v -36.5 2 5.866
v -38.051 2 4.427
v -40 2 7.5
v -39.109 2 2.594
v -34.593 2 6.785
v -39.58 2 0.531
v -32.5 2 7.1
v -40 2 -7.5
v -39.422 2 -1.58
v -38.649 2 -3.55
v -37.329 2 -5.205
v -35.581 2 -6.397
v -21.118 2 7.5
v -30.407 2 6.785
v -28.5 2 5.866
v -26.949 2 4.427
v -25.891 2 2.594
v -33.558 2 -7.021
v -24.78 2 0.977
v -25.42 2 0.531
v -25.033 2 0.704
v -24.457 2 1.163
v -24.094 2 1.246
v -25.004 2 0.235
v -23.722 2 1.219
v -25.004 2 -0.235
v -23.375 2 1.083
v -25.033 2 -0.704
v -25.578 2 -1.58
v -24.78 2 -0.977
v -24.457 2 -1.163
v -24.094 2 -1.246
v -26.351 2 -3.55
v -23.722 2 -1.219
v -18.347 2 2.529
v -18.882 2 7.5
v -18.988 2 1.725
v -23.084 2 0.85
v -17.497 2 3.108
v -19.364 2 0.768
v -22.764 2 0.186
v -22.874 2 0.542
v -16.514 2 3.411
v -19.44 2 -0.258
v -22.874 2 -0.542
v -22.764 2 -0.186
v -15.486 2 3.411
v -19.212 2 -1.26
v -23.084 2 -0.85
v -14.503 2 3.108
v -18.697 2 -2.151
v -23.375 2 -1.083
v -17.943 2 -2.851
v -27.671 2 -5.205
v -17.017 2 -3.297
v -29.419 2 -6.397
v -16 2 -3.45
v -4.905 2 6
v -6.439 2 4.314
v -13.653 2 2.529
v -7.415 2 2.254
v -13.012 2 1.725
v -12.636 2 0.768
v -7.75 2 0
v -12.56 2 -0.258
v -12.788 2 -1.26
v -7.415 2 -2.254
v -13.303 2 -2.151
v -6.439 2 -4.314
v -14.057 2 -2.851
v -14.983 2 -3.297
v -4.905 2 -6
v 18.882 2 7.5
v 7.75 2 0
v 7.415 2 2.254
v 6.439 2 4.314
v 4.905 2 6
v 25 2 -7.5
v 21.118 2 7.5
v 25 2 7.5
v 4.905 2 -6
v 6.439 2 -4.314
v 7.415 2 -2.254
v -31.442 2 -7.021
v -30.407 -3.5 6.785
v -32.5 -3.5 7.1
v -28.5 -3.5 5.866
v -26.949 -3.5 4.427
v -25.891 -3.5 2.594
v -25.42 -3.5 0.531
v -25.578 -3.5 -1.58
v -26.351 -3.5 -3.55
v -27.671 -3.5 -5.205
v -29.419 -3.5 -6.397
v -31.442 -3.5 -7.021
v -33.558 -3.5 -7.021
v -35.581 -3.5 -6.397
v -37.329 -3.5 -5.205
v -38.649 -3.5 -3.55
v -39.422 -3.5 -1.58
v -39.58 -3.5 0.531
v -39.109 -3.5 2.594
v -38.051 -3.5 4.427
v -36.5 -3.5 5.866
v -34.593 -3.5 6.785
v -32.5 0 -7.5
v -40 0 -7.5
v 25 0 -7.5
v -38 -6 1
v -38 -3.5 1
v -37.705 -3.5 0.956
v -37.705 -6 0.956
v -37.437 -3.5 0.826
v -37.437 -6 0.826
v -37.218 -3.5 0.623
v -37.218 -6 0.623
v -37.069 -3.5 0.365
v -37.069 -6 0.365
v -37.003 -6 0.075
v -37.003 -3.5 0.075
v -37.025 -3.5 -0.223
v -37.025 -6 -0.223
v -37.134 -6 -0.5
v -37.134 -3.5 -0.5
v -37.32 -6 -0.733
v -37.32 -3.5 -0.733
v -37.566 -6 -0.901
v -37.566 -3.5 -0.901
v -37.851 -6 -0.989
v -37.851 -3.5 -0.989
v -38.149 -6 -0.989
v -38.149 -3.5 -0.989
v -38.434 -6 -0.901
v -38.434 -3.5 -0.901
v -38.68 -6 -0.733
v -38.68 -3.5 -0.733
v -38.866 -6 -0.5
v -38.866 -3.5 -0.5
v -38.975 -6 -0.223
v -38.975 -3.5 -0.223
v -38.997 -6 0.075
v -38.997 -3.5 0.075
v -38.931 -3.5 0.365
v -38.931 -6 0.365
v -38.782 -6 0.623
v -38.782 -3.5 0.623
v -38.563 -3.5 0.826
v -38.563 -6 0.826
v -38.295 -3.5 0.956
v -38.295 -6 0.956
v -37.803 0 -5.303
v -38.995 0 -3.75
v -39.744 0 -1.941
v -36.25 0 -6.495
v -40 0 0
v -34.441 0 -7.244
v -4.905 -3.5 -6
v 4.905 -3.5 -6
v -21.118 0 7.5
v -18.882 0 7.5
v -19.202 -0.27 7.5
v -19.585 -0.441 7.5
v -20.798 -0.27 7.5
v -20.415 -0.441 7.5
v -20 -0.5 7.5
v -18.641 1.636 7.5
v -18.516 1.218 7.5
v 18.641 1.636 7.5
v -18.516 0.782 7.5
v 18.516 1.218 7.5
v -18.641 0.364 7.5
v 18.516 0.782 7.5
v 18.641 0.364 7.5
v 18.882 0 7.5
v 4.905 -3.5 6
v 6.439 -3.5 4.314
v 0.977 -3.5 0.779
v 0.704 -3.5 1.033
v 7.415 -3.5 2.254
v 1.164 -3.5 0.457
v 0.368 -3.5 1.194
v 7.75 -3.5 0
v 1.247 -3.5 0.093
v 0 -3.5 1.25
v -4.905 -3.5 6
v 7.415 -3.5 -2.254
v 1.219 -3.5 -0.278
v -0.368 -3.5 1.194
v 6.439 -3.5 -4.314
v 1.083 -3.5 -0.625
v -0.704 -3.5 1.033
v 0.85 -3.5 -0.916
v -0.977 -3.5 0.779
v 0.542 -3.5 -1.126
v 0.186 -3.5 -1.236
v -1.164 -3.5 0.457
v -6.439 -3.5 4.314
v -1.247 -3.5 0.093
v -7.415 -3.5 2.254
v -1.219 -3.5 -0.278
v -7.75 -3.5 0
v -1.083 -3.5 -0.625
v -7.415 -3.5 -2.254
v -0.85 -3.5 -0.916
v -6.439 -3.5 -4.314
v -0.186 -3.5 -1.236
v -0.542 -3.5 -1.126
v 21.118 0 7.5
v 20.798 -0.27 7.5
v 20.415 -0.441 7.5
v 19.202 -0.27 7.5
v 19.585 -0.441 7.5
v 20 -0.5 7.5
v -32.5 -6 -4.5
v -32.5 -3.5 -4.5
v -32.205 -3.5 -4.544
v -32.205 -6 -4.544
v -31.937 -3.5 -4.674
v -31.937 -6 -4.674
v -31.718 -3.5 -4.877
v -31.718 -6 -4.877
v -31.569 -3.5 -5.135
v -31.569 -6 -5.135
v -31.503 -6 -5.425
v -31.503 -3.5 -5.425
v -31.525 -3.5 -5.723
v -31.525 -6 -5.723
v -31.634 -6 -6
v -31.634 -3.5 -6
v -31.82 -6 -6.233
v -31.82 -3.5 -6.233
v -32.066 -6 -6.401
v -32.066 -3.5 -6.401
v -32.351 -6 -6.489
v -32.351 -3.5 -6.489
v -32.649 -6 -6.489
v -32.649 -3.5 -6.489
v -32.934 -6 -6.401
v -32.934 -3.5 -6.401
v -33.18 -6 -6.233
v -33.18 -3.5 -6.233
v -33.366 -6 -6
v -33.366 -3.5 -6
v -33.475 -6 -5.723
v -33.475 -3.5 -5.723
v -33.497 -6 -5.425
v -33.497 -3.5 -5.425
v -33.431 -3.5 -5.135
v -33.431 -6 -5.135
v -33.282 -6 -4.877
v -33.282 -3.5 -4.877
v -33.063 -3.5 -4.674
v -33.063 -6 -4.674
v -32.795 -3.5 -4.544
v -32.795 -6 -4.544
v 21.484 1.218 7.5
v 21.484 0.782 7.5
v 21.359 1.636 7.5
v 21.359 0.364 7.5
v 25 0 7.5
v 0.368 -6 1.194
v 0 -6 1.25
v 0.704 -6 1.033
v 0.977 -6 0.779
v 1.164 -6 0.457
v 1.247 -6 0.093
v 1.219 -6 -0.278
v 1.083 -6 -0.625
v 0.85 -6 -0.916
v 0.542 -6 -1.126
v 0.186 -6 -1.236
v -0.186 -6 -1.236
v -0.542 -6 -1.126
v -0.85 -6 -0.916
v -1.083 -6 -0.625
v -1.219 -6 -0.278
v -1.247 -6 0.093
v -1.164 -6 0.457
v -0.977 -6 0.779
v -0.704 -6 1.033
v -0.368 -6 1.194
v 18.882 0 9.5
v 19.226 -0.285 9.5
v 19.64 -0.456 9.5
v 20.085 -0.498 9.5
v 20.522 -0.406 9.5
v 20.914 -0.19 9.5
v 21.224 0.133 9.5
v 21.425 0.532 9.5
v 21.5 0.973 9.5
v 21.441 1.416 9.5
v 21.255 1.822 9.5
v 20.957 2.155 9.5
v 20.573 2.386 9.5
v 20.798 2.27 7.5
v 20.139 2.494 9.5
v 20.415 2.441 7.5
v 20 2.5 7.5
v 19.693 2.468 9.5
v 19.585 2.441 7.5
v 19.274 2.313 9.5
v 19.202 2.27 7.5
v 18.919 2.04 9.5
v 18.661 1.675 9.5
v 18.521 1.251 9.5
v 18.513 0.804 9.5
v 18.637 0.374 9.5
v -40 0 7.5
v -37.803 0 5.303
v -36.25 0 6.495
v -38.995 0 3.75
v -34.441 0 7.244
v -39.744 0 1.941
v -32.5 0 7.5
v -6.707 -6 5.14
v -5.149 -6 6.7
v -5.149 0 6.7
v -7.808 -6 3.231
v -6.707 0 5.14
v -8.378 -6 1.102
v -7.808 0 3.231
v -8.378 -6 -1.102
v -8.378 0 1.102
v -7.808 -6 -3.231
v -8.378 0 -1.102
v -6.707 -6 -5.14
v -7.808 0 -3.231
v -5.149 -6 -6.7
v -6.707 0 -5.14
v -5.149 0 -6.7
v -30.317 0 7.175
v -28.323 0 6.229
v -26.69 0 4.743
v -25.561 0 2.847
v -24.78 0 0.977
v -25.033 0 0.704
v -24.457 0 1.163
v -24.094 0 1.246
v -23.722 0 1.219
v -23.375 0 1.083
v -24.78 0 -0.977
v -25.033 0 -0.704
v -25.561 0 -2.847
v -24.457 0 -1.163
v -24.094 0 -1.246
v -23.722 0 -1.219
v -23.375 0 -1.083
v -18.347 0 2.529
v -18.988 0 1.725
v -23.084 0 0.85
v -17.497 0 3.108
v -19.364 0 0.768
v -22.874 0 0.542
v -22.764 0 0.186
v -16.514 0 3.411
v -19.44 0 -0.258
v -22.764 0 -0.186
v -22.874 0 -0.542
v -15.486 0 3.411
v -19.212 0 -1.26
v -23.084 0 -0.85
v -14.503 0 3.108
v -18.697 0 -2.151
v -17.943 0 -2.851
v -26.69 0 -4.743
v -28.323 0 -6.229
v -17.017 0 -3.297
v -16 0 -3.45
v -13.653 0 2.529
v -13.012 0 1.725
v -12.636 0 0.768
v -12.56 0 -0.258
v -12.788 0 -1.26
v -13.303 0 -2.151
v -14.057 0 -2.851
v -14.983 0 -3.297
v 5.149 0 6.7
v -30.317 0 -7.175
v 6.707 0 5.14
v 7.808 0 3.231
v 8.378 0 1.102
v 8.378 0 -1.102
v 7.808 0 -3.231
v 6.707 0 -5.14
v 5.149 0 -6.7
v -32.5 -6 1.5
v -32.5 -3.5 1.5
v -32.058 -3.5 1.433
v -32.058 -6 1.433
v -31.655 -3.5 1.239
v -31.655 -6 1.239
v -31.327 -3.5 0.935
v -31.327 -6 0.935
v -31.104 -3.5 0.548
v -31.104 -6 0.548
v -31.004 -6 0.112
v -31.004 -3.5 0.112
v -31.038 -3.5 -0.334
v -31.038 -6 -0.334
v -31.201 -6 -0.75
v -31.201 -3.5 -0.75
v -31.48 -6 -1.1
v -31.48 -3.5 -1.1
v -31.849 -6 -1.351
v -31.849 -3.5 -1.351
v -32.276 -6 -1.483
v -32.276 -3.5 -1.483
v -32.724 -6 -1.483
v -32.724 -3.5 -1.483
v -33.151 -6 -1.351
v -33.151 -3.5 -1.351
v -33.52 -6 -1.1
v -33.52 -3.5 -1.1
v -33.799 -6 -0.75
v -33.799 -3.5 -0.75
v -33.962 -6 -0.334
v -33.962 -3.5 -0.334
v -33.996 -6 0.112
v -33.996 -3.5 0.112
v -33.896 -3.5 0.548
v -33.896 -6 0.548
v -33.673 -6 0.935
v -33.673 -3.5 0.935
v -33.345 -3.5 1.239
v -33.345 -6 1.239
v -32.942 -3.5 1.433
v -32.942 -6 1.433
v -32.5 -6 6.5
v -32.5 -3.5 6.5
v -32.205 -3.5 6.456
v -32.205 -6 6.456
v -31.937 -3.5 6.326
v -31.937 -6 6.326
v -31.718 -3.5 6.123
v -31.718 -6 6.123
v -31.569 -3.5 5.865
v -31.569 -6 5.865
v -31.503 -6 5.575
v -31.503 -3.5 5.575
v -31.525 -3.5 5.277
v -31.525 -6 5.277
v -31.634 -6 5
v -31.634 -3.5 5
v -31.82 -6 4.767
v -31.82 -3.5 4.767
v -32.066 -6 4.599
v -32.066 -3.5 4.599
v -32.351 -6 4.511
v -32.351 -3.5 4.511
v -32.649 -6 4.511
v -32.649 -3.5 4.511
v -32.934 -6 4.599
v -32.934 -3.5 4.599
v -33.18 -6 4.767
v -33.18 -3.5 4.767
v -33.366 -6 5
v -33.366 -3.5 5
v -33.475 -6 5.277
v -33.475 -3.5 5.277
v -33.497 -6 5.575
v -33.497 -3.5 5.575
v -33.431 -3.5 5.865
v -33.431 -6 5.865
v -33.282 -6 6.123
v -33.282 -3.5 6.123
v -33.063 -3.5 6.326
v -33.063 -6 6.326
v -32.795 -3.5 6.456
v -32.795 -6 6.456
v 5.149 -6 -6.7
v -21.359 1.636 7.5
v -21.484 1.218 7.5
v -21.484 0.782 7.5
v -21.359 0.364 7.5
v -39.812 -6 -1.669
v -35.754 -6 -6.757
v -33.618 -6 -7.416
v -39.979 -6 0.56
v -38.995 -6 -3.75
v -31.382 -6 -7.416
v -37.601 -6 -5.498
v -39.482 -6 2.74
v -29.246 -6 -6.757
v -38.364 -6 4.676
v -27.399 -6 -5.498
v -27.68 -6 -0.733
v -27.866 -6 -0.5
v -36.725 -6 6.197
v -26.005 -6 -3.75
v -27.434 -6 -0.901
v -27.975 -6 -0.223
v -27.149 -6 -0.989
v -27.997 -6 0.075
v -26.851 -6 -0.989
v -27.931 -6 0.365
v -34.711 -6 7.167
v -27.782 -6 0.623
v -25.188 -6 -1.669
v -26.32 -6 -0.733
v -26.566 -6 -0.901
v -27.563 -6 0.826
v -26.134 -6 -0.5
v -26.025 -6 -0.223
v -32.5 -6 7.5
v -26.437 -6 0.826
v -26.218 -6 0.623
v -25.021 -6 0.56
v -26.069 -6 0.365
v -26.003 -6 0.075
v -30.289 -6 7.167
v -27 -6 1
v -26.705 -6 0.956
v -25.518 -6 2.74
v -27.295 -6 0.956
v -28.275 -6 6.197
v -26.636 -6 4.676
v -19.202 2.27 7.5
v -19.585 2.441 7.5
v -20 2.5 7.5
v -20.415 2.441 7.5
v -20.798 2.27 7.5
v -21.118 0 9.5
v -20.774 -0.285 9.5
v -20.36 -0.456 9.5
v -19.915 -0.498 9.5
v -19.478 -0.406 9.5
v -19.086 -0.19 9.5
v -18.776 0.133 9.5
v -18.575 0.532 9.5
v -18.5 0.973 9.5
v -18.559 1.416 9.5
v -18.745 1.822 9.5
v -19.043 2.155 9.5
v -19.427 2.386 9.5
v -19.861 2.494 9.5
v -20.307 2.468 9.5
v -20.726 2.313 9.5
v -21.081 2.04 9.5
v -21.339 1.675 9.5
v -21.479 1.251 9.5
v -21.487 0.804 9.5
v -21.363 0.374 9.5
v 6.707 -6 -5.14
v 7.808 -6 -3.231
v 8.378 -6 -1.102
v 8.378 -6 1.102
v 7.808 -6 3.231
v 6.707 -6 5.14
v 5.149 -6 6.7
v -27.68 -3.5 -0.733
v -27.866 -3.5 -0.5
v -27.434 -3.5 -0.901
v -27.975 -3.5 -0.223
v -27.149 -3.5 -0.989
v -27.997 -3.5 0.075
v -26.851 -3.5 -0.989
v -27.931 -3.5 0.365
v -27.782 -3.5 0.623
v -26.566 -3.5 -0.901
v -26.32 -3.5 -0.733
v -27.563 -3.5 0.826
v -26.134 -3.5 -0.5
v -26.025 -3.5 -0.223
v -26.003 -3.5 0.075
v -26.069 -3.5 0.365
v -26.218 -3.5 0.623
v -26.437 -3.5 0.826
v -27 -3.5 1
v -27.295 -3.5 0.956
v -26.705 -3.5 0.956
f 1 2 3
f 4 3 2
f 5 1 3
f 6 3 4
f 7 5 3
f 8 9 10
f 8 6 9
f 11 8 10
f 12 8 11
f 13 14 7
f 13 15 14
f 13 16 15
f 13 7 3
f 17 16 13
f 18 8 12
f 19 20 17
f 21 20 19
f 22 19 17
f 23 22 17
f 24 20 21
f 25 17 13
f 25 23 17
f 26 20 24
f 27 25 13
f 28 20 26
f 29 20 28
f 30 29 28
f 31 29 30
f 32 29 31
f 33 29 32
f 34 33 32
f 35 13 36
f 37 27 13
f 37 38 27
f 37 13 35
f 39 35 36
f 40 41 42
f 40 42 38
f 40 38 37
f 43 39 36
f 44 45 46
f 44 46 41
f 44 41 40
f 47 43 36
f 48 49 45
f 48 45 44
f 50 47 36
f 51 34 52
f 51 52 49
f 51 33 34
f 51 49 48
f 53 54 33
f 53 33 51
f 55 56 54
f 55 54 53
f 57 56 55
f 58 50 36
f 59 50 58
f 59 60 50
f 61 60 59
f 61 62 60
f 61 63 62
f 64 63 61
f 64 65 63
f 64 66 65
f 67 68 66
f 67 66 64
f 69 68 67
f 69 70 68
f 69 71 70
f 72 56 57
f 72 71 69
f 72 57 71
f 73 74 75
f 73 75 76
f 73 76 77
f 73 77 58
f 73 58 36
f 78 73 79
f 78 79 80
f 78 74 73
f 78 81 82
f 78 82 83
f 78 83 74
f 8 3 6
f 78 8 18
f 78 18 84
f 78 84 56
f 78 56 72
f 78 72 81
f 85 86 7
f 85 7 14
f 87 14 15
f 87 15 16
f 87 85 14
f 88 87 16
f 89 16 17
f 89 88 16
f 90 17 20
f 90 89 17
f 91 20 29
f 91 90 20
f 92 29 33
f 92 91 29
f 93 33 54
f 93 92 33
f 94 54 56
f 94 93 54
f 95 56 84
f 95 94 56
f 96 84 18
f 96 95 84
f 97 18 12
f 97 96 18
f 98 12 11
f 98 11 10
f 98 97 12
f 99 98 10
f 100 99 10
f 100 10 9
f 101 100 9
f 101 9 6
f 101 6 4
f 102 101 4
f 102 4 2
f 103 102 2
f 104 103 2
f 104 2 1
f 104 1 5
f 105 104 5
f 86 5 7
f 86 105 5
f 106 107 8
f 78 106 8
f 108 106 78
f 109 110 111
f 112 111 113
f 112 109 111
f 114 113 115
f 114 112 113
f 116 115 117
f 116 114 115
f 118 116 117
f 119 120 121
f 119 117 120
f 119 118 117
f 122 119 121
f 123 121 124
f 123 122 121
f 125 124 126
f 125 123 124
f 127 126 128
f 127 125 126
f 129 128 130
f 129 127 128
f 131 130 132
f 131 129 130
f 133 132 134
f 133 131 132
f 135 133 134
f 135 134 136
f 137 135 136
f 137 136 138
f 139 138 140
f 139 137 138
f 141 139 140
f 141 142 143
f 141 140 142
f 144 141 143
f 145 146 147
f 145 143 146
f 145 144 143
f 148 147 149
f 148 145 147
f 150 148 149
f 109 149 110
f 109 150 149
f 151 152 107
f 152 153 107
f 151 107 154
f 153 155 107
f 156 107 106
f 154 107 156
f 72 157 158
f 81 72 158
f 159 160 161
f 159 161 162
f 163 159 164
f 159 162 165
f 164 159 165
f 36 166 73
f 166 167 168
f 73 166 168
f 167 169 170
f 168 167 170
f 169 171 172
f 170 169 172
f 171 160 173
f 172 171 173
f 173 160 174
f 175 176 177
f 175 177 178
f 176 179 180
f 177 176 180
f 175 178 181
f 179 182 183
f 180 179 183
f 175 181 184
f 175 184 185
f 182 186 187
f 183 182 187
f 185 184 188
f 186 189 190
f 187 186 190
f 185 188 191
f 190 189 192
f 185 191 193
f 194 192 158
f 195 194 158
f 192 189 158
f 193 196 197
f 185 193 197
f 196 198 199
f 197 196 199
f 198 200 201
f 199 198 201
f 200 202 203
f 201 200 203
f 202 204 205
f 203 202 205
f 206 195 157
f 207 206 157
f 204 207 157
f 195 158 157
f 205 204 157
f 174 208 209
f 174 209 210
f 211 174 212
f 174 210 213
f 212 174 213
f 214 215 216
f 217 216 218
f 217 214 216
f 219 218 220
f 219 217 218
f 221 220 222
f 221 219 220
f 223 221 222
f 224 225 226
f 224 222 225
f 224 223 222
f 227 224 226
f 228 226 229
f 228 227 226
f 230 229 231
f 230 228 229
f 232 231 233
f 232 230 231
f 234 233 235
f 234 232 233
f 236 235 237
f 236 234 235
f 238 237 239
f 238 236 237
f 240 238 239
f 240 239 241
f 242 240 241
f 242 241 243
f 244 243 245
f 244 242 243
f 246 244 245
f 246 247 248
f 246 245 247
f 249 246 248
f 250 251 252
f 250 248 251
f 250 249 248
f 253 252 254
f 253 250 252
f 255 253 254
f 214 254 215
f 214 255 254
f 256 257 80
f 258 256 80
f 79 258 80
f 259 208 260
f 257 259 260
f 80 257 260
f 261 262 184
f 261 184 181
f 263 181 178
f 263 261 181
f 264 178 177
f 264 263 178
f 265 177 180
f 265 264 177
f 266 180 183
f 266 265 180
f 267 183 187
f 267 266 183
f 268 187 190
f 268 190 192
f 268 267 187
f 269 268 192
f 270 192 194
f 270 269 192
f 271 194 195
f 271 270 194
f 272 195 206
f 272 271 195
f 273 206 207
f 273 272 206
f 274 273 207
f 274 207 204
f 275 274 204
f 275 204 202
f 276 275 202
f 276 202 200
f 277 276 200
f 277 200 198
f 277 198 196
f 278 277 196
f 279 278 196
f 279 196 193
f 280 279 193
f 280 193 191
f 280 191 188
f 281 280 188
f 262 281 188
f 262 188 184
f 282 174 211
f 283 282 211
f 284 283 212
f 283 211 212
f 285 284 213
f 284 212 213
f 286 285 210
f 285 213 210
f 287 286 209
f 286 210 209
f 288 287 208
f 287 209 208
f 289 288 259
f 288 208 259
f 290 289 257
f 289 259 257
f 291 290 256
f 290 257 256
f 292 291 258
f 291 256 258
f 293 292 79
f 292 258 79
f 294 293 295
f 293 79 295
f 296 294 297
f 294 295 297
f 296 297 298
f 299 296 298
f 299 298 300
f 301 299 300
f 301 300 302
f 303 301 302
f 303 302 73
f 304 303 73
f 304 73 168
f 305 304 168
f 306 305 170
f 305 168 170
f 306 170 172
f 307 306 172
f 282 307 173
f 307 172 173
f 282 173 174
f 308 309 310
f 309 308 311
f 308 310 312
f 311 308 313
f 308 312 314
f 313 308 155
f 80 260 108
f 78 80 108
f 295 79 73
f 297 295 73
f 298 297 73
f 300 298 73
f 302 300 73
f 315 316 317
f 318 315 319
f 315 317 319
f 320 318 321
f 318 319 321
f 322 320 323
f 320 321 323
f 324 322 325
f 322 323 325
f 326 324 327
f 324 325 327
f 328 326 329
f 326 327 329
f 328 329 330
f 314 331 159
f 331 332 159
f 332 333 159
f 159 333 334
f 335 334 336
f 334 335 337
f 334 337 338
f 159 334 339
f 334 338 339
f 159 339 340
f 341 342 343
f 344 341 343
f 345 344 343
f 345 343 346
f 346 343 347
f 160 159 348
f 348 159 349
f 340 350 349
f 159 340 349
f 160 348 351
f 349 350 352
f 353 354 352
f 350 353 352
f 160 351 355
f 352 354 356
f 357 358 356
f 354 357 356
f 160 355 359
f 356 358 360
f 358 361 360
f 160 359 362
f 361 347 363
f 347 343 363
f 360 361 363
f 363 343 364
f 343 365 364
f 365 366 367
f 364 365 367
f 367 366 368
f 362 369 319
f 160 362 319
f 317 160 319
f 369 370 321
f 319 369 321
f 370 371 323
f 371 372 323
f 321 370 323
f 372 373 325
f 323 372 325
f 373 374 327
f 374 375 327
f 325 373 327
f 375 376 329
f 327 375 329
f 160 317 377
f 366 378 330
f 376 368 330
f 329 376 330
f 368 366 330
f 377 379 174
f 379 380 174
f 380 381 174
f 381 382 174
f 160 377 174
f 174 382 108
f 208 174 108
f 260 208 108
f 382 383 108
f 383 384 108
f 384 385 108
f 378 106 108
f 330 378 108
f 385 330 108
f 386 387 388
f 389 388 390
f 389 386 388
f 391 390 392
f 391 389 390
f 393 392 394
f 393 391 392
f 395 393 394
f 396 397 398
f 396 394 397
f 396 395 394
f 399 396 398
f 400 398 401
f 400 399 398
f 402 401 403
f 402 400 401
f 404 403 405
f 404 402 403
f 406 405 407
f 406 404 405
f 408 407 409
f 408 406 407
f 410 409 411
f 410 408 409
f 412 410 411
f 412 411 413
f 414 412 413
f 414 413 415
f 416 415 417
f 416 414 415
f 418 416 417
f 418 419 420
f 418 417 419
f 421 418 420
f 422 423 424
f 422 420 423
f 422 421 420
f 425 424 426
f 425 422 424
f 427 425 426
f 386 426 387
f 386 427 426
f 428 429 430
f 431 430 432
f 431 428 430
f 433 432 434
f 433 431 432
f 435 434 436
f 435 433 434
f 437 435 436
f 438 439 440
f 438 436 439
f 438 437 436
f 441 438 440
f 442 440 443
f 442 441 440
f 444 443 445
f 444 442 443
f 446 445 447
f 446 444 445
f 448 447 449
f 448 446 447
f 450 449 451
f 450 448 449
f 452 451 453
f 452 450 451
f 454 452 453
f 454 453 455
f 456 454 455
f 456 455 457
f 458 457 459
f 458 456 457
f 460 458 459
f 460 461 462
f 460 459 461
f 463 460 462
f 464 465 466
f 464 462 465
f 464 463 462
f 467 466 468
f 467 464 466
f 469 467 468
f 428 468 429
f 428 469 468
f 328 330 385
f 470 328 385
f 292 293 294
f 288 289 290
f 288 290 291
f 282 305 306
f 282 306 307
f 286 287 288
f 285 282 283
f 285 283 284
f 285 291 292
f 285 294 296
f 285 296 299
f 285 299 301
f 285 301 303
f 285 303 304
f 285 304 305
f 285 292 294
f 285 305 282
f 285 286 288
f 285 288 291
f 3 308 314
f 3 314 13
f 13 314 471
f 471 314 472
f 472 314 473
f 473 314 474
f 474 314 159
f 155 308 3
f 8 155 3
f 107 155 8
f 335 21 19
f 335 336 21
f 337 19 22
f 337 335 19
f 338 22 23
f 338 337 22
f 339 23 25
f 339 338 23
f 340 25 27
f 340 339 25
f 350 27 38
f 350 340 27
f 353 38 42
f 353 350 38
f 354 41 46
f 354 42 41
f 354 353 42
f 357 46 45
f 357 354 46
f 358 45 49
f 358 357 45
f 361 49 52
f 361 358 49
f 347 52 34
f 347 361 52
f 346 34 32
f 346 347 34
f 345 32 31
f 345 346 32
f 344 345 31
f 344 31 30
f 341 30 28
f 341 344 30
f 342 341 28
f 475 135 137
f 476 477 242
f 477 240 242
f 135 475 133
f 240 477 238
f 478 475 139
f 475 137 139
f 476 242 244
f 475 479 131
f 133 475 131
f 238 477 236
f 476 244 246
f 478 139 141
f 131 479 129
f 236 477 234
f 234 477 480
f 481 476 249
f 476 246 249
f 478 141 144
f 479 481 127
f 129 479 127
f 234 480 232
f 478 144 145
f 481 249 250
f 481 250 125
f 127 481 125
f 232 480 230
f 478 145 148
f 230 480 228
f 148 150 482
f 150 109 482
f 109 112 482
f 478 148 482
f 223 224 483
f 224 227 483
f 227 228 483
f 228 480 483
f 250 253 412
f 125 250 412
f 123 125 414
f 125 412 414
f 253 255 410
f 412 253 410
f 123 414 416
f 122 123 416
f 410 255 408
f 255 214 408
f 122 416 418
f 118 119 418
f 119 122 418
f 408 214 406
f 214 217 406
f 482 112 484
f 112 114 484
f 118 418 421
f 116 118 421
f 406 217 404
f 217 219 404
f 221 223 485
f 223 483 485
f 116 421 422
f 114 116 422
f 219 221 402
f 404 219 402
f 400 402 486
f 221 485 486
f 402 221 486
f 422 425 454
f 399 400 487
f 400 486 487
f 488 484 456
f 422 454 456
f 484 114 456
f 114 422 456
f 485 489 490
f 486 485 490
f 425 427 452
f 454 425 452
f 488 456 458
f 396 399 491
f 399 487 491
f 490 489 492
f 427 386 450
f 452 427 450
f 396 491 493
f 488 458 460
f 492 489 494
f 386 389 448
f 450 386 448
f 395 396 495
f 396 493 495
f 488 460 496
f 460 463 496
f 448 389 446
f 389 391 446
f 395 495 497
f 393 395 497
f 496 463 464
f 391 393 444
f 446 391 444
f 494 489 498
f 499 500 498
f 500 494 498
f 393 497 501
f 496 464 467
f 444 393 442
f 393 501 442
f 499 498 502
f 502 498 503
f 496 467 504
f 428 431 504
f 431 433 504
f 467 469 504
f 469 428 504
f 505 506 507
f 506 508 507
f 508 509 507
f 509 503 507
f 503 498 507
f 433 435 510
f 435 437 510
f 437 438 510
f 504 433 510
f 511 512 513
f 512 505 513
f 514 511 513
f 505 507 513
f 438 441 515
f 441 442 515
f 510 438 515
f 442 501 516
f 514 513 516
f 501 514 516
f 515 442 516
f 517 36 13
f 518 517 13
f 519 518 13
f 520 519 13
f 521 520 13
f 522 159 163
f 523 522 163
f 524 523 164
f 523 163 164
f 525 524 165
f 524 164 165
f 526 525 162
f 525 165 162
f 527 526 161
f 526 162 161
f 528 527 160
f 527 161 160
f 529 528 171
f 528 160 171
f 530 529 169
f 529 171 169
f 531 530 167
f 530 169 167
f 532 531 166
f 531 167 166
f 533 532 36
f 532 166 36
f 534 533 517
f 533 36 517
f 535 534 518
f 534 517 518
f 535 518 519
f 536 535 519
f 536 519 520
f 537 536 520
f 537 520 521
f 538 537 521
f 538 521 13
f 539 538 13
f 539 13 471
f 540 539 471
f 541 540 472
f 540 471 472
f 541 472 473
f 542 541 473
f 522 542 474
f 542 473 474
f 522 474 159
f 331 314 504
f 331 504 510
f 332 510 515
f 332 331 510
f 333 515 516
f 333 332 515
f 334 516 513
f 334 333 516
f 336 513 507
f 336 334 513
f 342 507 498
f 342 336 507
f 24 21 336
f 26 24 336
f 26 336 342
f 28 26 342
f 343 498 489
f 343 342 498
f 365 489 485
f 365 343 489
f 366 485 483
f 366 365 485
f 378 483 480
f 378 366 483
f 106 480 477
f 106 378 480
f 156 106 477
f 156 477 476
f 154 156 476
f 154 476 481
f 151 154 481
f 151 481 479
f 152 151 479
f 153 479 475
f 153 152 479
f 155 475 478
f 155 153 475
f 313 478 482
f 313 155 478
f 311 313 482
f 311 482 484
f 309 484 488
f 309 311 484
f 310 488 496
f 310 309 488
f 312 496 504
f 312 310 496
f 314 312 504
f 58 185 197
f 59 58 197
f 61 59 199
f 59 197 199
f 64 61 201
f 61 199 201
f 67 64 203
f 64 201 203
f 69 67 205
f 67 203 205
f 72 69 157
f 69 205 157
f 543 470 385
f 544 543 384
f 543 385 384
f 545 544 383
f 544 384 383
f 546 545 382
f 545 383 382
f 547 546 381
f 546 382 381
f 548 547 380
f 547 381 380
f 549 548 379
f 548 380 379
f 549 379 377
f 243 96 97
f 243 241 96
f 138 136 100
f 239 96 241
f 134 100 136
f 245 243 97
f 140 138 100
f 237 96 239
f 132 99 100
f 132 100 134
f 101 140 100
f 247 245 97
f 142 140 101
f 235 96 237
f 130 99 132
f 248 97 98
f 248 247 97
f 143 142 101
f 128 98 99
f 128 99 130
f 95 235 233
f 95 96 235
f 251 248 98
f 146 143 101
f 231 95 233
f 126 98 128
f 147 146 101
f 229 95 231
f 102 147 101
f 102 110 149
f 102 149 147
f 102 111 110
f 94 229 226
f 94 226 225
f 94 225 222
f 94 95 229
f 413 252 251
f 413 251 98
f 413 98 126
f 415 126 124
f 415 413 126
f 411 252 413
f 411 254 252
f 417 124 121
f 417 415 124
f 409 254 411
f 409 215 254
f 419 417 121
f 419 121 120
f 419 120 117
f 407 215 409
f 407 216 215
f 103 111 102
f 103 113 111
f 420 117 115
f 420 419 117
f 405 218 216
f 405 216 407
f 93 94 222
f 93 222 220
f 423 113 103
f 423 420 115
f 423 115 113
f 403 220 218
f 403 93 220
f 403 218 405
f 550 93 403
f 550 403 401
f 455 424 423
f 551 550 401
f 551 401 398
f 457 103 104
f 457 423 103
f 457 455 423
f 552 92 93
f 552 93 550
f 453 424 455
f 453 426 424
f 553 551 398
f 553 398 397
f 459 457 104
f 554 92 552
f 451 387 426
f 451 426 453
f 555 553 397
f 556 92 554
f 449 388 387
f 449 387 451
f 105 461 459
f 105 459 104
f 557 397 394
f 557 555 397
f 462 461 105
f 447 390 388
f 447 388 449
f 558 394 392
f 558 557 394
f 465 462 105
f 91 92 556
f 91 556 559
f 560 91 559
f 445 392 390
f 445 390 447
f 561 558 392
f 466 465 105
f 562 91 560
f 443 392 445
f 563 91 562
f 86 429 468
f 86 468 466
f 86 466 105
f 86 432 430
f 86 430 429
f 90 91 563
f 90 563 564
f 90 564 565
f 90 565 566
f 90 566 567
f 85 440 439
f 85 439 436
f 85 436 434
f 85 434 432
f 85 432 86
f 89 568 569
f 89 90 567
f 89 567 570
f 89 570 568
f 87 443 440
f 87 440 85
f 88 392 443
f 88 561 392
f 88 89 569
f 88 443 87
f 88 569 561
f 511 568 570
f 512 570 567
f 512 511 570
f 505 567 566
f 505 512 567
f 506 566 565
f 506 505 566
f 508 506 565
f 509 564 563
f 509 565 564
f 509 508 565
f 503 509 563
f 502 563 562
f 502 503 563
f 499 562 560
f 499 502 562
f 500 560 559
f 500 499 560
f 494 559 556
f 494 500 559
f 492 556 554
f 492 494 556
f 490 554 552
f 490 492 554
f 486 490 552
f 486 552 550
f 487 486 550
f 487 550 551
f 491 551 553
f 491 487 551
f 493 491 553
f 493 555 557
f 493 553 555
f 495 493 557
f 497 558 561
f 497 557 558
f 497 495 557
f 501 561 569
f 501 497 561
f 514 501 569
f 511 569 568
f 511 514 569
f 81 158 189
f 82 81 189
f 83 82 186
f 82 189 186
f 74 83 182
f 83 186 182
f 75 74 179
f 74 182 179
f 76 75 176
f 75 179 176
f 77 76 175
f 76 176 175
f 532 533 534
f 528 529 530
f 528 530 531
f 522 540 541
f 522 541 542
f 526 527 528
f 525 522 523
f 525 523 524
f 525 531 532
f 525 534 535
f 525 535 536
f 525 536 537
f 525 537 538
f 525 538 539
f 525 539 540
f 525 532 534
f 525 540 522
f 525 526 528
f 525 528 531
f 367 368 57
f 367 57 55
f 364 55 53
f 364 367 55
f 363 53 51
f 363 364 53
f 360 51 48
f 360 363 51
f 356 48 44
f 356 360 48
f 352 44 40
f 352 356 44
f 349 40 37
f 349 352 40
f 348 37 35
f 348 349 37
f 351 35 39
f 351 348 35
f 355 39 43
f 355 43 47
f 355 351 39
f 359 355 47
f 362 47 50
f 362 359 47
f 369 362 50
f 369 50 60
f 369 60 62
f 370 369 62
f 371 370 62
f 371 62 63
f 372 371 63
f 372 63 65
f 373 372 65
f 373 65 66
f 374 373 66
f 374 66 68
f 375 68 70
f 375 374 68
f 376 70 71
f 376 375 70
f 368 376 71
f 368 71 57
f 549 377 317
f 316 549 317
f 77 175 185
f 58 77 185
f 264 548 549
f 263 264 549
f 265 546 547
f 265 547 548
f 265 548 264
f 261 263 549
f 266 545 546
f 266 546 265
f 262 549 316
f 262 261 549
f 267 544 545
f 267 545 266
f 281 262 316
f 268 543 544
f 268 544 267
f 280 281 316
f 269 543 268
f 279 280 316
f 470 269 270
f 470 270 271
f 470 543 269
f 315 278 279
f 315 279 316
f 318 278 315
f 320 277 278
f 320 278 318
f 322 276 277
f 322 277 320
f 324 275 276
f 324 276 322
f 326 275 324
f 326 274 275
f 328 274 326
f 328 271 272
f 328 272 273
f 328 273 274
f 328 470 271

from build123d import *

# Parameters (mm, degrees)
SKETCH_1_W          = 65
SKETCH_1_H          = 15
EXTRUDE_1_DEPTH     = 2
SKETCH_2_R          = 1.25
SKETCH_2_R_2        = 3.45
SKETCH_2_R_3        = 1.5
SKETCH_2_R_4        = 1
CUT_EXTRUDE_1_DEPTH = 2
SKETCH_4_R          = 1.5
EXTRUDE_2_DEPTH     = 2
SKETCH_5_R          = 7.5
SKETCH_5_R_2        = 7.1
EXTRUDE_3_DEPTH     = 8
EXTRUDE_START       = -8
SKETCH_5_5_R        = 1.25
SKETCH_5_5_R_2      = 7.1
SKETCH_5_5_R_3      = 1
SKETCH_5_5_R_4      = 1.5
EXTRUDE_4_DEPTH     = 6
CUT_EXTRUDE_START   = -5.5
SKETCH_5_6_R        = 1.25
SKETCH_5_6_R_2      = 7.1
CUT_EXTRUDE_3_DEPTH = 5.5


with BuildPart() as part:
    # 草图1 → 凸台-拉伸1 (new body)
    with BuildSketch(Plane(origin=(0, 0, 0), x_dir=(1, 0, 0), z_dir=(0, 1, 0))):
        with Locations((-7.5, 0)):
            Rectangle(SKETCH_1_W, SKETCH_1_H)
    extrude(amount=EXTRUDE_1_DEPTH)

    # 草图2 → 切除-拉伸1 (cut)
    with BuildSketch(Plane(origin=(0, 0, 0), x_dir=(1, 0, 0), z_dir=(0, 1, 0))):
        with Locations(Location((0, 0, 0), (0, 0, 270))):
            Circle(SKETCH_2_R)
        with Locations(Location((-16, 0, 0), (0, 0, 90))):
            Circle(SKETCH_2_R_2)
        with Locations(Location((-24, 0, 0), (0, 0, 90))):
            Circle(SKETCH_2_R)
        with Locations(Location((-32.5, 0, 0), (0, 0, 270))):
            Circle(SKETCH_2_R_3)
        with Locations(Location((-27, 0, 0), (0, 0, 270))):
            Circle(SKETCH_2_R_4)
        with Locations(Location((-32.5, -5.5, 0), (0, 0, 270))):
            Circle(SKETCH_2_R_4)
        with Locations(Location((-38, 0, 0), (0, 0, 270))):
            Circle(SKETCH_2_R_4)
        with Locations(Location((-32.5, 5.5, 0), (0, 0, 270))):
            Circle(SKETCH_2_R_4)
    extrude(amount=CUT_EXTRUDE_1_DEPTH, mode=Mode.SUBTRACT)

    # 草图4 → 凸台-拉伸2 (add)
    with BuildSketch(Plane.XY.offset(7.5)):
        with Locations(Location((20, 1, 0), (0, 0, 221.810314896))):
            Circle(SKETCH_4_R)
        with Locations(Location((-20, 1, 0), (0, 0, 221.810314896))):
            Circle(SKETCH_4_R)
    extrude(amount=EXTRUDE_2_DEPTH)

    # 草图5 → 凸台-拉伸3 (add)
    # profile 1 of 2: a face of its own
    with BuildSketch(Plane(origin=(0, 2, 0), x_dir=(1, 0, 0), z_dir=(0, 1, 0))):
        with Locations(Location((-32.5, 0, 0), (0, 0, 270))):
            Circle(SKETCH_5_R)
        with Locations(Location((-32.5, 0, 0), (0, 0, 270))):
            Circle(SKETCH_5_R_2, mode=Mode.SUBTRACT)
    # profile 2 of 2: a face of its own
    with BuildSketch(Plane(origin=(0, 2, 0), x_dir=(1, 0, 0), z_dir=(0, 1, 0))):
        with BuildLine():
            Line((5.149029035, -6.7), (-5.149029035, -6.7))
            ThreePointArc((-5.149029035, -6.7), (-8.45, 0), (-5.149029035, 6.7))
            Line((-5.149029035, 6.7), (5.149029035, 6.7))
            ThreePointArc((5.149029035, 6.7), (8.45, 0), (5.149029035, -6.7))
        make_face()
        with BuildLine():
            Line((4.905354218, -6), (-4.905354218, -6))
            ThreePointArc((-4.905354218, -6), (-7.75, 0), (-4.905354218, 6))
            Line((-4.905354218, 6), (4.905354218, 6))
            ThreePointArc((4.905354218, 6), (7.75, 0), (4.905354218, -6))
        make_face(mode=Mode.SUBTRACT)
    extrude(amount=-EXTRUDE_3_DEPTH)

    # 草图5<5> → 凸台-拉伸4 (add)
    # profile 1 of 2: a face of its own
    with BuildSketch(Plane(origin=(0, 2, 0), x_dir=(1, 0, 0), z_dir=(0, 1, 0)).offset(EXTRUDE_START)):
        with BuildLine():
            Line((4.905354218, -6), (-4.905354218, -6))
            ThreePointArc((-4.905354218, -6), (-7.75, 0), (-4.905354218, 6))
            Line((-4.905354218, 6), (4.905354218, 6))
            ThreePointArc((4.905354218, 6), (7.75, 0), (4.905354218, -6))
        make_face()
        with Locations(Location((0, 0, 0), (0, 0, 270))):
            Circle(SKETCH_5_5_R, mode=Mode.SUBTRACT)
    # profile 2 of 2: a face of its own
    with BuildSketch(Plane(origin=(0, 2, 0), x_dir=(1, 0, 0), z_dir=(0, 1, 0)).offset(EXTRUDE_START)):
        with Locations((-32.5, 0)):
            Circle(SKETCH_5_5_R_2)
        with Locations(Location((-32.5, 5.5, 0), (0, 0, 270))):
            Circle(SKETCH_5_5_R_3, mode=Mode.SUBTRACT)
        with Locations(Location((-38, 0, 0), (0, 0, 270))):
            Circle(SKETCH_5_5_R_3, mode=Mode.SUBTRACT)
        with Locations(Location((-32.5, 0, 0), (0, 0, 270))):
            Circle(SKETCH_5_5_R_4, mode=Mode.SUBTRACT)
        with Locations(Location((-27, 0, 0), (0, 0, 270))):
            Circle(SKETCH_5_5_R_3, mode=Mode.SUBTRACT)
        with Locations(Location((-32.5, -5.5, 0), (0, 0, 270))):
            Circle(SKETCH_5_5_R_3, mode=Mode.SUBTRACT)
    extrude(amount=EXTRUDE_4_DEPTH)

    # 草图5<6> → 切除-拉伸3 (cut)
    # profile 1 of 2: a face of its own
    with BuildSketch(Plane(origin=(0, 2, 0), x_dir=(1, 0, 0), z_dir=(0, 1, 0)).offset(CUT_EXTRUDE_START)):
        with BuildLine():
            Line((4.905354218, -6), (-4.905354218, -6))
            ThreePointArc((-4.905354218, -6), (-7.75, 0), (-4.905354218, 6))
            Line((-4.905354218, 6), (4.905354218, 6))
            ThreePointArc((4.905354218, 6), (7.75, 0), (4.905354218, -6))
        make_face()
        with Locations(Location((0, 0, 0), (0, 0, 270))):
            Circle(SKETCH_5_6_R, mode=Mode.SUBTRACT)
    # profile 2 of 2: a face of its own
    with BuildSketch(Plane(origin=(0, 2, 0), x_dir=(1, 0, 0), z_dir=(0, 1, 0)).offset(CUT_EXTRUDE_START)):
        with Locations(Location((-32.5, 0, 0), (0, 0, 270))):
            Circle(SKETCH_5_6_R_2)
    extrude(amount=CUT_EXTRUDE_3_DEPTH, mode=Mode.SUBTRACT)


solid = part.part
